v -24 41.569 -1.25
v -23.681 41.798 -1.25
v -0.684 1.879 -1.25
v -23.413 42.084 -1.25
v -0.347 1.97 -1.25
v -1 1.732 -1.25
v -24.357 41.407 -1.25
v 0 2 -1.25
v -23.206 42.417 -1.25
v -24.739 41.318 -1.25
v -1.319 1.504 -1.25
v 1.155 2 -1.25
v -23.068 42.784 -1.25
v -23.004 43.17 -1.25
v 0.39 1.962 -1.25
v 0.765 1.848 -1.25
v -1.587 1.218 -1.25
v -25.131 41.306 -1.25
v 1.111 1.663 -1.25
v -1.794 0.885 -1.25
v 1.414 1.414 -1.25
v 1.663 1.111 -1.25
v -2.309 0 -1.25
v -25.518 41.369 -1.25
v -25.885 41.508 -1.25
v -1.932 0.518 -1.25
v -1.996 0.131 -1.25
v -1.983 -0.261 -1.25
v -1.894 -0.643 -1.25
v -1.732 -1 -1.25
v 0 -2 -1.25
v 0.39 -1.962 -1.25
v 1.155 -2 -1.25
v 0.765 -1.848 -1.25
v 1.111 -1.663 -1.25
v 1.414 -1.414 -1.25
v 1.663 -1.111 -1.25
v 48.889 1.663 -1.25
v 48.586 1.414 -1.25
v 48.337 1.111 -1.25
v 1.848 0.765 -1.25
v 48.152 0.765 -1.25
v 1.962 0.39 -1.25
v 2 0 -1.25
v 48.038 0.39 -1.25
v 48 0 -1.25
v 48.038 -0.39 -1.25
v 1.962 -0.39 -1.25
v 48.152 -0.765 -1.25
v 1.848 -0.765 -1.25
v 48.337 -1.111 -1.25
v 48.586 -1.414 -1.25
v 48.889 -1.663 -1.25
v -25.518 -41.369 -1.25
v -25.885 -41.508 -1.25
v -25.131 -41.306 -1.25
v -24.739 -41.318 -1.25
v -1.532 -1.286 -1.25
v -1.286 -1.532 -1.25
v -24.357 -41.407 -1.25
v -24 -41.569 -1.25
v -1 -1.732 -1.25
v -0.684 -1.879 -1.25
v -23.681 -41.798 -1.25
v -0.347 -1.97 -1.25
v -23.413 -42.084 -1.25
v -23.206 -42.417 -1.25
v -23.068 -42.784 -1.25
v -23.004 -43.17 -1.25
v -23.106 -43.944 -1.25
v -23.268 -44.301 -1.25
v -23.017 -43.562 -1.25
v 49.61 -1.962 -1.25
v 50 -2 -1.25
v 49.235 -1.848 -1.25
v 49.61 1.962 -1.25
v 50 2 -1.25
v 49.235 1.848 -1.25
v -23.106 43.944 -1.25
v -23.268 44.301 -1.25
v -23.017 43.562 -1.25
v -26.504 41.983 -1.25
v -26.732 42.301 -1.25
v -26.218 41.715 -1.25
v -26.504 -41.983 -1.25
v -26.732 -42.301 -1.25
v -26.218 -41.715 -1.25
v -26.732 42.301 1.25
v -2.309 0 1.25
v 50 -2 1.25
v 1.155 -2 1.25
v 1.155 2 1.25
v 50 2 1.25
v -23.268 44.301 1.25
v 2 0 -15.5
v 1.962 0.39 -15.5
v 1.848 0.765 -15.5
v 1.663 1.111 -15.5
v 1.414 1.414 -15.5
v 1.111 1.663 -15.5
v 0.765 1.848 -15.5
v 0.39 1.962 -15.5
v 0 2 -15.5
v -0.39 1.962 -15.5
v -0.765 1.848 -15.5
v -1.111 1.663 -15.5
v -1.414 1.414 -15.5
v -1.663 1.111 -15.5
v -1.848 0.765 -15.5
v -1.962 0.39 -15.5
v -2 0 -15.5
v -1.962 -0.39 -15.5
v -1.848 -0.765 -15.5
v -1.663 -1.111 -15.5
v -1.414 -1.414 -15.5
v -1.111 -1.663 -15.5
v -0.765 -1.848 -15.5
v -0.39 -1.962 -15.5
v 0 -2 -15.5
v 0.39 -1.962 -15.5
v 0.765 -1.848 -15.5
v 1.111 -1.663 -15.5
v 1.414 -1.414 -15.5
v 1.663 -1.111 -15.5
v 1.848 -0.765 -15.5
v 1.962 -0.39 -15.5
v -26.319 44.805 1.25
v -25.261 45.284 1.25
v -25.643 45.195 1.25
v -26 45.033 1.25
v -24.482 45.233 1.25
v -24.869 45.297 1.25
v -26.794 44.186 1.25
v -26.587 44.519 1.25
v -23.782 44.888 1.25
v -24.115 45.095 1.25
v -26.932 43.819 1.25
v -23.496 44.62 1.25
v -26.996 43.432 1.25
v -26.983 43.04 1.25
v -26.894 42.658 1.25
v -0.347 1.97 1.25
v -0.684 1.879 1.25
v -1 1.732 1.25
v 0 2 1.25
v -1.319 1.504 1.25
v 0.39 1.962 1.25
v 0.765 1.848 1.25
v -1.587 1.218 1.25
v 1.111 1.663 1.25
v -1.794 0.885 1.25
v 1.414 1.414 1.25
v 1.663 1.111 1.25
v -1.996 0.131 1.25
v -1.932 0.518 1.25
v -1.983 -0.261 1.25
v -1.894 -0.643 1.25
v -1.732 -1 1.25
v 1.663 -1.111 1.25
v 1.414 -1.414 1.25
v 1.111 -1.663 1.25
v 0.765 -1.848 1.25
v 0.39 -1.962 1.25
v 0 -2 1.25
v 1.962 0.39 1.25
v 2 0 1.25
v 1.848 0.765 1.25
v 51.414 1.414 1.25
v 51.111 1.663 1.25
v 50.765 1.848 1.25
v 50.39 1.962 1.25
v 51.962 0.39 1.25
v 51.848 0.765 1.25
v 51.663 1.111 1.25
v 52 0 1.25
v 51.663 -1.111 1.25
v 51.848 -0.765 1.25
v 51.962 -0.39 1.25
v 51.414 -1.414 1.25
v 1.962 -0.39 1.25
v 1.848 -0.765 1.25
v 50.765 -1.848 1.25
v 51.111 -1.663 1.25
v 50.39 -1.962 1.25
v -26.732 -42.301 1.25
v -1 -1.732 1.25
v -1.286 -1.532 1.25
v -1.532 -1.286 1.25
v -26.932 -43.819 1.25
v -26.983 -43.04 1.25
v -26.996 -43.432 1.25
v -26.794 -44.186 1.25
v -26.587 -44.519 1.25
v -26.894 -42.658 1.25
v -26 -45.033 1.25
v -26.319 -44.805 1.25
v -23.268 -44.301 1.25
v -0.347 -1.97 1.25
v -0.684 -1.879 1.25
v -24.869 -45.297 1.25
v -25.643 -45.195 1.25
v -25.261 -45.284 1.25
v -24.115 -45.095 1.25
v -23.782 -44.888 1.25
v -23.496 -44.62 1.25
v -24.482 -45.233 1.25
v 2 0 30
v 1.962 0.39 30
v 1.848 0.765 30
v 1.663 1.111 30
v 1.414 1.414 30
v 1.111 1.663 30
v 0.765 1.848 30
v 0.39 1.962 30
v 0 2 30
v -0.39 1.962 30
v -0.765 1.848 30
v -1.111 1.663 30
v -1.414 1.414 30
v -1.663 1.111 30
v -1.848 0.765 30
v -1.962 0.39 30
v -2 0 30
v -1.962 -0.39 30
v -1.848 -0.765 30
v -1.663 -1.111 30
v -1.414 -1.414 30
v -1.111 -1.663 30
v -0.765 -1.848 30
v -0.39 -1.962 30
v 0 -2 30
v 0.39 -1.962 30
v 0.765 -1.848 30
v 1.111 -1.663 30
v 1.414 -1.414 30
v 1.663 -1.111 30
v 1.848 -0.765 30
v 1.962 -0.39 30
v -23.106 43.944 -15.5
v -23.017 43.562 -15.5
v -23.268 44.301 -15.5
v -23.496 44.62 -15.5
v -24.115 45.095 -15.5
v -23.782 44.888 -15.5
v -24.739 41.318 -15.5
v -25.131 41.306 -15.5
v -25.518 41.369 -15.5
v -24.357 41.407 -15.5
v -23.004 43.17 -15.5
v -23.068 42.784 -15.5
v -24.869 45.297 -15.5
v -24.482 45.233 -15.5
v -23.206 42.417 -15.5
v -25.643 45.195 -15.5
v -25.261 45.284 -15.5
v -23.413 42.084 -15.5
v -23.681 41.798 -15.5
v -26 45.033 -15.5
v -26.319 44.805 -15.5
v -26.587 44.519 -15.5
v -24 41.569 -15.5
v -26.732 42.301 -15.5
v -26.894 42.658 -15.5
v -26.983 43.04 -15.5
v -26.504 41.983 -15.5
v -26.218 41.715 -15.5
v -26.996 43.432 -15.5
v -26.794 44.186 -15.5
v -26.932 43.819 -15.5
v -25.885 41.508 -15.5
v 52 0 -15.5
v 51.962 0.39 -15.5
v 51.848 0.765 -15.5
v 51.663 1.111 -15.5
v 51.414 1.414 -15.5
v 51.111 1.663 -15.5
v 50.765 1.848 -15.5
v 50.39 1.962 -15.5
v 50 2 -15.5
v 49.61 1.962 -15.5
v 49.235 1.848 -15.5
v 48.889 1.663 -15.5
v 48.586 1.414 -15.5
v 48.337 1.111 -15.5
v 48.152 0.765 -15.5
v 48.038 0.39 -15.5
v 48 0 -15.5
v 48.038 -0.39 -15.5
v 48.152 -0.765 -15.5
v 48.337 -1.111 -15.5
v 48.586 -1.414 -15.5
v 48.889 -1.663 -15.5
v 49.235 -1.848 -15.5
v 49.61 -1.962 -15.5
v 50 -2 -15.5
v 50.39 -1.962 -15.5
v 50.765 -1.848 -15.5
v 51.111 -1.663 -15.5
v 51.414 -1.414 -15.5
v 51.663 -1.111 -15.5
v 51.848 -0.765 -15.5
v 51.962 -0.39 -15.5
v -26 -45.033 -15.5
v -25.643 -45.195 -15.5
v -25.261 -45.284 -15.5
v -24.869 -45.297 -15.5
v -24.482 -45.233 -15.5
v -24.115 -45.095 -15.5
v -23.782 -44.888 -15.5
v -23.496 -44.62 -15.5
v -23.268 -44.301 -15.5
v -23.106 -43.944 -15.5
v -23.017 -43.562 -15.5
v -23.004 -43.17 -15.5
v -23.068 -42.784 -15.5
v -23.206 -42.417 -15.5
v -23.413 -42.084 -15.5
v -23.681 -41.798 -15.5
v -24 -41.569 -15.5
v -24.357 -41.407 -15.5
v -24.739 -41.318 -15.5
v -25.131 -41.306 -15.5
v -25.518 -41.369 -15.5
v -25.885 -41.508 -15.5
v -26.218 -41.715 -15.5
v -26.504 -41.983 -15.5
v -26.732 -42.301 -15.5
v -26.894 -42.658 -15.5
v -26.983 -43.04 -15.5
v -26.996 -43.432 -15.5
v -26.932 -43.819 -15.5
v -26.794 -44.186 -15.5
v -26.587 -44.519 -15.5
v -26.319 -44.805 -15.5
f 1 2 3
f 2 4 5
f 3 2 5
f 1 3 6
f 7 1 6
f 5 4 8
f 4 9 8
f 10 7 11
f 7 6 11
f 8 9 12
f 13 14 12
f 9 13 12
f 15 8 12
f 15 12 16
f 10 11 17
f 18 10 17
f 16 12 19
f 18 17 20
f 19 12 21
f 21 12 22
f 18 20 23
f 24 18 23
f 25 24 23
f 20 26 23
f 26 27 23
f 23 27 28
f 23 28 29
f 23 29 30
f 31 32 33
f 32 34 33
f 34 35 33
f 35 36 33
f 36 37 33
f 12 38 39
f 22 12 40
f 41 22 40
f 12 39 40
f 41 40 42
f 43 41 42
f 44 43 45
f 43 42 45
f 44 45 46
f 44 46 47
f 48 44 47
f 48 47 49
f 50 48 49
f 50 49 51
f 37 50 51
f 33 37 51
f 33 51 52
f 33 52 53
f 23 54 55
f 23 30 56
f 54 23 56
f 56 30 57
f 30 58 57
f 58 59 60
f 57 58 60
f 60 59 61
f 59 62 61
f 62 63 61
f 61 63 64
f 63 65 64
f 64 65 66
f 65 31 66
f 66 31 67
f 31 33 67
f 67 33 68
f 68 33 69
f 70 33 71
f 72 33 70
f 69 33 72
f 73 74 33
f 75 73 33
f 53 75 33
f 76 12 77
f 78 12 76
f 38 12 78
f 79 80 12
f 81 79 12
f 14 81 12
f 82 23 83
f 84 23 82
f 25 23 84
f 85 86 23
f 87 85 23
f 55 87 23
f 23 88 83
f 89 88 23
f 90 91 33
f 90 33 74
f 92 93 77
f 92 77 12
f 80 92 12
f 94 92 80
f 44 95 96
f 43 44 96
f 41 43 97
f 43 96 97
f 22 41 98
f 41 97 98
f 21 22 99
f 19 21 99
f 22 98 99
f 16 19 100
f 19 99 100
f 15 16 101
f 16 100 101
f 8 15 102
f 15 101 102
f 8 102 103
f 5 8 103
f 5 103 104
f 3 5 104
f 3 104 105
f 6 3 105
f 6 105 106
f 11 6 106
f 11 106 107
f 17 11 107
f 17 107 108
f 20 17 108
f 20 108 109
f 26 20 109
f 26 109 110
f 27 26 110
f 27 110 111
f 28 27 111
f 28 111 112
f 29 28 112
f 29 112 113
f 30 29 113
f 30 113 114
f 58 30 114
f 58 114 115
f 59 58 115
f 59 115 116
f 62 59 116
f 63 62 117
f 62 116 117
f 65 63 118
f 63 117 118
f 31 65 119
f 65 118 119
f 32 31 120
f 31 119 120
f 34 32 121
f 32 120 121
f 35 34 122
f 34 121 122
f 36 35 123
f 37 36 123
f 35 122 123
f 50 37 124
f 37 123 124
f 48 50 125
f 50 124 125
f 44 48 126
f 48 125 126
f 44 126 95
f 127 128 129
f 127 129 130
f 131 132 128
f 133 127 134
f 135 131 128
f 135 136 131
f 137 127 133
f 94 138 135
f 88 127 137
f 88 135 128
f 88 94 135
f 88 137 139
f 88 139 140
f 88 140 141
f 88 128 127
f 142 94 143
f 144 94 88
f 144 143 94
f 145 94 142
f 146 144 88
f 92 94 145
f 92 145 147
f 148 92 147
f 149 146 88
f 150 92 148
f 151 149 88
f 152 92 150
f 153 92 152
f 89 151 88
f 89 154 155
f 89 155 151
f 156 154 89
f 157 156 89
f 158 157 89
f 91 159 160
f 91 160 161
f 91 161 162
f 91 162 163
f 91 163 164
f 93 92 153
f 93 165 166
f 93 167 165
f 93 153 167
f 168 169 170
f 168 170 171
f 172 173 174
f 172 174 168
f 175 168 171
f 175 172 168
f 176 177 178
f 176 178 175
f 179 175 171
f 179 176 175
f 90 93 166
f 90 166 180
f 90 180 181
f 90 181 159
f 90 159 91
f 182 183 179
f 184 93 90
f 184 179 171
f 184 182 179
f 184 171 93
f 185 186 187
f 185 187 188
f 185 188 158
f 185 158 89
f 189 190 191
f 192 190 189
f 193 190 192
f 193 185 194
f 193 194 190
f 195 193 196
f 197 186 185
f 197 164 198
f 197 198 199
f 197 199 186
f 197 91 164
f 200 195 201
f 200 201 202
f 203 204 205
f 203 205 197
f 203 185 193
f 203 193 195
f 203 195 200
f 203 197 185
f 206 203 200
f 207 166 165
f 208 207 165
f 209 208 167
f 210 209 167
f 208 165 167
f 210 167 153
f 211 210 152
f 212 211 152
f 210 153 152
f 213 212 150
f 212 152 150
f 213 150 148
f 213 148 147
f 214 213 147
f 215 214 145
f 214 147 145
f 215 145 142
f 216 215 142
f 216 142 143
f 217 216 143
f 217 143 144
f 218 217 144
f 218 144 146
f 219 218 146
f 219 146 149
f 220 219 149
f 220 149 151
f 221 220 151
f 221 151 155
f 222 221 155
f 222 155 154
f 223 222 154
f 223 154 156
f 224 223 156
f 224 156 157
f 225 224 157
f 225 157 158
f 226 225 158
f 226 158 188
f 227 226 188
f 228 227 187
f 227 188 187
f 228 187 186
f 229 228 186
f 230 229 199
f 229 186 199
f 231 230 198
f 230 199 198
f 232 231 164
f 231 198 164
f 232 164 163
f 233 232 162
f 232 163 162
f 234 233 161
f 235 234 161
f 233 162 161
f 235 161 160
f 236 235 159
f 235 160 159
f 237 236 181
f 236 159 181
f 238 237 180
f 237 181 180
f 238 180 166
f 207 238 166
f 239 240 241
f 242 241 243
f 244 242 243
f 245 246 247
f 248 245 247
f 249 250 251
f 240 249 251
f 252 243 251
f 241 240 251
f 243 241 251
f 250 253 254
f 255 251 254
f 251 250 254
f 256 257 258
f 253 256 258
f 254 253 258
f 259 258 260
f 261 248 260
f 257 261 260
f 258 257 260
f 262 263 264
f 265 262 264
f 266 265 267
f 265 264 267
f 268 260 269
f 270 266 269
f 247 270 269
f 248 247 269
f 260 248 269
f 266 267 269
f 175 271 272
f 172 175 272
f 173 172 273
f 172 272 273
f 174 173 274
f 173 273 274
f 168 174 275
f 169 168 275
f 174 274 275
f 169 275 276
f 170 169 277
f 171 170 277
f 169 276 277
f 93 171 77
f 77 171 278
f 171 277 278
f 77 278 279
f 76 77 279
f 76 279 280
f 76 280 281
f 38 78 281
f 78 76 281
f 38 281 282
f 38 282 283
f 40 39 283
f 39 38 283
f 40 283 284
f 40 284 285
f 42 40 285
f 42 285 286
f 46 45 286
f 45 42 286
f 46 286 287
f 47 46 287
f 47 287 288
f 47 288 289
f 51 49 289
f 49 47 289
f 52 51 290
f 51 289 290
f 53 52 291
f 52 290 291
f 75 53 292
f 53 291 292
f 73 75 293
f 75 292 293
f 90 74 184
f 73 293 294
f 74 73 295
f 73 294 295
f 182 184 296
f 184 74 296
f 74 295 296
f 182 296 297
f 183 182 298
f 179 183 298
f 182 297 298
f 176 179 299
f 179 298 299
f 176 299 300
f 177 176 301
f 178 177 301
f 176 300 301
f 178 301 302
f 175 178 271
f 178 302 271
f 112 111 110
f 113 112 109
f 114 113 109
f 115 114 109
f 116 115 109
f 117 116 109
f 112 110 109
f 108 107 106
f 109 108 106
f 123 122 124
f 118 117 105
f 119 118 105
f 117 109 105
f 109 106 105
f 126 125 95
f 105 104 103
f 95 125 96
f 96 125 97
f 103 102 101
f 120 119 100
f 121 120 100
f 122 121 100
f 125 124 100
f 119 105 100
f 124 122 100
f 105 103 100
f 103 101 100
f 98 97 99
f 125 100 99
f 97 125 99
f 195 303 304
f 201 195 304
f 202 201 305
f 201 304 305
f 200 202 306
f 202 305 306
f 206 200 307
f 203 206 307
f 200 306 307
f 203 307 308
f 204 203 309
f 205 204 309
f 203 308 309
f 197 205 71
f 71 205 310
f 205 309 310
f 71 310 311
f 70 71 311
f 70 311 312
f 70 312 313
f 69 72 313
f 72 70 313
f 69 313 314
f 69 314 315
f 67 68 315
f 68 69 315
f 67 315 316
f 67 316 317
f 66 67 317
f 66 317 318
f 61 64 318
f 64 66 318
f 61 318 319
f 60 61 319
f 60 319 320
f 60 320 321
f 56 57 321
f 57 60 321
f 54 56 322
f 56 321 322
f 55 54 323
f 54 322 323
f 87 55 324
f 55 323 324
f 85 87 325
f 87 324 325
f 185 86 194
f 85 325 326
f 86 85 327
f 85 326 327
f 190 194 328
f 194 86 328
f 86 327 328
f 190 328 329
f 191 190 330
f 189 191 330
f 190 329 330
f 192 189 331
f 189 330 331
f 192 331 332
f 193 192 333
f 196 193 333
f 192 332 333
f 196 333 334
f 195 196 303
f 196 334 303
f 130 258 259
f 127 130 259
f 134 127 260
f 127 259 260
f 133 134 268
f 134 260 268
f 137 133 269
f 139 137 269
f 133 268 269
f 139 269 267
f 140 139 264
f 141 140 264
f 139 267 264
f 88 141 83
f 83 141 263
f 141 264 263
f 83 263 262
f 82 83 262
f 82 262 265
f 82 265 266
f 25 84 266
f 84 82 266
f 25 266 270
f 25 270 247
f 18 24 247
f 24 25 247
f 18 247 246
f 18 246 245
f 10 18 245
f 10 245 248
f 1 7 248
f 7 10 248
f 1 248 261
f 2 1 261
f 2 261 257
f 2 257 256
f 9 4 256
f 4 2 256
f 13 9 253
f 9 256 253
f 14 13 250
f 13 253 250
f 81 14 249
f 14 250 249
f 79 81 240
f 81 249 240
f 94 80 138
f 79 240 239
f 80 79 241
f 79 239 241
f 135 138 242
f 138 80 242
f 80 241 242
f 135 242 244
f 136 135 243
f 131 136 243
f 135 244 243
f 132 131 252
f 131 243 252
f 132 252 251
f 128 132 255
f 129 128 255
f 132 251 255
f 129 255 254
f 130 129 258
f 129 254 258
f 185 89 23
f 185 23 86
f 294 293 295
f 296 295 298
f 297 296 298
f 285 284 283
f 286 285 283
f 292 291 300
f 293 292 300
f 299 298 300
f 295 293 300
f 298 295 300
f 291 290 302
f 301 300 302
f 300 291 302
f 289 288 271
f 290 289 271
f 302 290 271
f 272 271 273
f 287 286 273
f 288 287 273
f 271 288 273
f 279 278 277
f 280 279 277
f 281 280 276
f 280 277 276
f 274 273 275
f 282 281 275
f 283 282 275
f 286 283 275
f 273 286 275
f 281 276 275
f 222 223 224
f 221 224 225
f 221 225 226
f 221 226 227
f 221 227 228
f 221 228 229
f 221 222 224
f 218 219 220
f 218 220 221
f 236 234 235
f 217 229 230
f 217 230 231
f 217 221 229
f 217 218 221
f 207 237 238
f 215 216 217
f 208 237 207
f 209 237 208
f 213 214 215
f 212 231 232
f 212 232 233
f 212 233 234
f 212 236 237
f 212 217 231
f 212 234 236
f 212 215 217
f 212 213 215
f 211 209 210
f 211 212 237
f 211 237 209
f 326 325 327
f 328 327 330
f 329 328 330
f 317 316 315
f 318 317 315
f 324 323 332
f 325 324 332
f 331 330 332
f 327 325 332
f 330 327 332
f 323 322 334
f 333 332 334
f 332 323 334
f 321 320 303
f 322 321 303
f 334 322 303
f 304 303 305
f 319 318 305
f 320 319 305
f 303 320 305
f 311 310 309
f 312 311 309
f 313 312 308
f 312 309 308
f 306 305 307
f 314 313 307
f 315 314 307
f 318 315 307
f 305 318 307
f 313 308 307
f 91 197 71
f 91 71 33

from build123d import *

# Parameters (mm, degrees)
BOSS_EXTRUDE1_DEPTH = 1.25
BOSS_EXTRUDE4_START = 1.25
SKETCH1_5_R         = 2
BOSS_EXTRUDE4_DEPTH = 16.75
BOSS_EXTRUDE5_START = 30
SKETCH1_6_R         = 2
BOSS_EXTRUDE5_DEPTH = 30
CIRPATTERN1_COUNT   = 3


with BuildPart() as part:
    # Sketch1 → Boss-Extrude1 (new, symmetric)
    with BuildSketch(Plane.XY):
        with BuildLine():
            ThreePointArc((0, 2), (2, 0), (0, -2))
            Line((0, -2), (50, -2))
            ThreePointArc((50, -2), (48, 0), (50, 2))
            Line((50, 2), (0, 2))
        make_face()
    boss_extrude1 = extrude(amount=BOSS_EXTRUDE1_DEPTH, both=True)

    # Sketch1<5> → Boss-Extrude4 (add)
    with BuildSketch(Plane.XY.offset(BOSS_EXTRUDE4_START)):
        Circle(SKETCH1_5_R)
        with Locations((50, 0)):
            Circle(SKETCH1_5_R)
    boss_extrude4 = extrude(amount=-BOSS_EXTRUDE4_DEPTH)

    # Sketch1<6> → Boss-Extrude5 (add)
    with BuildSketch(Plane.XY.offset(BOSS_EXTRUDE5_START)):
        Circle(SKETCH1_6_R)
    extrude(amount=-BOSS_EXTRUDE5_DEPTH)

    # CirPattern1: Boss-Extrude1, Boss-Extrude4 ×3 about axis
    cirpattern1_axis = Axis((0, 0, 30), (0, 0, 1))
    add([boss_extrude1.rotate(cirpattern1_axis, i * 360 / CIRPATTERN1_COUNT) for i in range(1, CIRPATTERN1_COUNT)])
    add([boss_extrude4.rotate(cirpattern1_axis, i * 360 / CIRPATTERN1_COUNT) for i in range(1, CIRPATTERN1_COUNT)])


solid = part.part
